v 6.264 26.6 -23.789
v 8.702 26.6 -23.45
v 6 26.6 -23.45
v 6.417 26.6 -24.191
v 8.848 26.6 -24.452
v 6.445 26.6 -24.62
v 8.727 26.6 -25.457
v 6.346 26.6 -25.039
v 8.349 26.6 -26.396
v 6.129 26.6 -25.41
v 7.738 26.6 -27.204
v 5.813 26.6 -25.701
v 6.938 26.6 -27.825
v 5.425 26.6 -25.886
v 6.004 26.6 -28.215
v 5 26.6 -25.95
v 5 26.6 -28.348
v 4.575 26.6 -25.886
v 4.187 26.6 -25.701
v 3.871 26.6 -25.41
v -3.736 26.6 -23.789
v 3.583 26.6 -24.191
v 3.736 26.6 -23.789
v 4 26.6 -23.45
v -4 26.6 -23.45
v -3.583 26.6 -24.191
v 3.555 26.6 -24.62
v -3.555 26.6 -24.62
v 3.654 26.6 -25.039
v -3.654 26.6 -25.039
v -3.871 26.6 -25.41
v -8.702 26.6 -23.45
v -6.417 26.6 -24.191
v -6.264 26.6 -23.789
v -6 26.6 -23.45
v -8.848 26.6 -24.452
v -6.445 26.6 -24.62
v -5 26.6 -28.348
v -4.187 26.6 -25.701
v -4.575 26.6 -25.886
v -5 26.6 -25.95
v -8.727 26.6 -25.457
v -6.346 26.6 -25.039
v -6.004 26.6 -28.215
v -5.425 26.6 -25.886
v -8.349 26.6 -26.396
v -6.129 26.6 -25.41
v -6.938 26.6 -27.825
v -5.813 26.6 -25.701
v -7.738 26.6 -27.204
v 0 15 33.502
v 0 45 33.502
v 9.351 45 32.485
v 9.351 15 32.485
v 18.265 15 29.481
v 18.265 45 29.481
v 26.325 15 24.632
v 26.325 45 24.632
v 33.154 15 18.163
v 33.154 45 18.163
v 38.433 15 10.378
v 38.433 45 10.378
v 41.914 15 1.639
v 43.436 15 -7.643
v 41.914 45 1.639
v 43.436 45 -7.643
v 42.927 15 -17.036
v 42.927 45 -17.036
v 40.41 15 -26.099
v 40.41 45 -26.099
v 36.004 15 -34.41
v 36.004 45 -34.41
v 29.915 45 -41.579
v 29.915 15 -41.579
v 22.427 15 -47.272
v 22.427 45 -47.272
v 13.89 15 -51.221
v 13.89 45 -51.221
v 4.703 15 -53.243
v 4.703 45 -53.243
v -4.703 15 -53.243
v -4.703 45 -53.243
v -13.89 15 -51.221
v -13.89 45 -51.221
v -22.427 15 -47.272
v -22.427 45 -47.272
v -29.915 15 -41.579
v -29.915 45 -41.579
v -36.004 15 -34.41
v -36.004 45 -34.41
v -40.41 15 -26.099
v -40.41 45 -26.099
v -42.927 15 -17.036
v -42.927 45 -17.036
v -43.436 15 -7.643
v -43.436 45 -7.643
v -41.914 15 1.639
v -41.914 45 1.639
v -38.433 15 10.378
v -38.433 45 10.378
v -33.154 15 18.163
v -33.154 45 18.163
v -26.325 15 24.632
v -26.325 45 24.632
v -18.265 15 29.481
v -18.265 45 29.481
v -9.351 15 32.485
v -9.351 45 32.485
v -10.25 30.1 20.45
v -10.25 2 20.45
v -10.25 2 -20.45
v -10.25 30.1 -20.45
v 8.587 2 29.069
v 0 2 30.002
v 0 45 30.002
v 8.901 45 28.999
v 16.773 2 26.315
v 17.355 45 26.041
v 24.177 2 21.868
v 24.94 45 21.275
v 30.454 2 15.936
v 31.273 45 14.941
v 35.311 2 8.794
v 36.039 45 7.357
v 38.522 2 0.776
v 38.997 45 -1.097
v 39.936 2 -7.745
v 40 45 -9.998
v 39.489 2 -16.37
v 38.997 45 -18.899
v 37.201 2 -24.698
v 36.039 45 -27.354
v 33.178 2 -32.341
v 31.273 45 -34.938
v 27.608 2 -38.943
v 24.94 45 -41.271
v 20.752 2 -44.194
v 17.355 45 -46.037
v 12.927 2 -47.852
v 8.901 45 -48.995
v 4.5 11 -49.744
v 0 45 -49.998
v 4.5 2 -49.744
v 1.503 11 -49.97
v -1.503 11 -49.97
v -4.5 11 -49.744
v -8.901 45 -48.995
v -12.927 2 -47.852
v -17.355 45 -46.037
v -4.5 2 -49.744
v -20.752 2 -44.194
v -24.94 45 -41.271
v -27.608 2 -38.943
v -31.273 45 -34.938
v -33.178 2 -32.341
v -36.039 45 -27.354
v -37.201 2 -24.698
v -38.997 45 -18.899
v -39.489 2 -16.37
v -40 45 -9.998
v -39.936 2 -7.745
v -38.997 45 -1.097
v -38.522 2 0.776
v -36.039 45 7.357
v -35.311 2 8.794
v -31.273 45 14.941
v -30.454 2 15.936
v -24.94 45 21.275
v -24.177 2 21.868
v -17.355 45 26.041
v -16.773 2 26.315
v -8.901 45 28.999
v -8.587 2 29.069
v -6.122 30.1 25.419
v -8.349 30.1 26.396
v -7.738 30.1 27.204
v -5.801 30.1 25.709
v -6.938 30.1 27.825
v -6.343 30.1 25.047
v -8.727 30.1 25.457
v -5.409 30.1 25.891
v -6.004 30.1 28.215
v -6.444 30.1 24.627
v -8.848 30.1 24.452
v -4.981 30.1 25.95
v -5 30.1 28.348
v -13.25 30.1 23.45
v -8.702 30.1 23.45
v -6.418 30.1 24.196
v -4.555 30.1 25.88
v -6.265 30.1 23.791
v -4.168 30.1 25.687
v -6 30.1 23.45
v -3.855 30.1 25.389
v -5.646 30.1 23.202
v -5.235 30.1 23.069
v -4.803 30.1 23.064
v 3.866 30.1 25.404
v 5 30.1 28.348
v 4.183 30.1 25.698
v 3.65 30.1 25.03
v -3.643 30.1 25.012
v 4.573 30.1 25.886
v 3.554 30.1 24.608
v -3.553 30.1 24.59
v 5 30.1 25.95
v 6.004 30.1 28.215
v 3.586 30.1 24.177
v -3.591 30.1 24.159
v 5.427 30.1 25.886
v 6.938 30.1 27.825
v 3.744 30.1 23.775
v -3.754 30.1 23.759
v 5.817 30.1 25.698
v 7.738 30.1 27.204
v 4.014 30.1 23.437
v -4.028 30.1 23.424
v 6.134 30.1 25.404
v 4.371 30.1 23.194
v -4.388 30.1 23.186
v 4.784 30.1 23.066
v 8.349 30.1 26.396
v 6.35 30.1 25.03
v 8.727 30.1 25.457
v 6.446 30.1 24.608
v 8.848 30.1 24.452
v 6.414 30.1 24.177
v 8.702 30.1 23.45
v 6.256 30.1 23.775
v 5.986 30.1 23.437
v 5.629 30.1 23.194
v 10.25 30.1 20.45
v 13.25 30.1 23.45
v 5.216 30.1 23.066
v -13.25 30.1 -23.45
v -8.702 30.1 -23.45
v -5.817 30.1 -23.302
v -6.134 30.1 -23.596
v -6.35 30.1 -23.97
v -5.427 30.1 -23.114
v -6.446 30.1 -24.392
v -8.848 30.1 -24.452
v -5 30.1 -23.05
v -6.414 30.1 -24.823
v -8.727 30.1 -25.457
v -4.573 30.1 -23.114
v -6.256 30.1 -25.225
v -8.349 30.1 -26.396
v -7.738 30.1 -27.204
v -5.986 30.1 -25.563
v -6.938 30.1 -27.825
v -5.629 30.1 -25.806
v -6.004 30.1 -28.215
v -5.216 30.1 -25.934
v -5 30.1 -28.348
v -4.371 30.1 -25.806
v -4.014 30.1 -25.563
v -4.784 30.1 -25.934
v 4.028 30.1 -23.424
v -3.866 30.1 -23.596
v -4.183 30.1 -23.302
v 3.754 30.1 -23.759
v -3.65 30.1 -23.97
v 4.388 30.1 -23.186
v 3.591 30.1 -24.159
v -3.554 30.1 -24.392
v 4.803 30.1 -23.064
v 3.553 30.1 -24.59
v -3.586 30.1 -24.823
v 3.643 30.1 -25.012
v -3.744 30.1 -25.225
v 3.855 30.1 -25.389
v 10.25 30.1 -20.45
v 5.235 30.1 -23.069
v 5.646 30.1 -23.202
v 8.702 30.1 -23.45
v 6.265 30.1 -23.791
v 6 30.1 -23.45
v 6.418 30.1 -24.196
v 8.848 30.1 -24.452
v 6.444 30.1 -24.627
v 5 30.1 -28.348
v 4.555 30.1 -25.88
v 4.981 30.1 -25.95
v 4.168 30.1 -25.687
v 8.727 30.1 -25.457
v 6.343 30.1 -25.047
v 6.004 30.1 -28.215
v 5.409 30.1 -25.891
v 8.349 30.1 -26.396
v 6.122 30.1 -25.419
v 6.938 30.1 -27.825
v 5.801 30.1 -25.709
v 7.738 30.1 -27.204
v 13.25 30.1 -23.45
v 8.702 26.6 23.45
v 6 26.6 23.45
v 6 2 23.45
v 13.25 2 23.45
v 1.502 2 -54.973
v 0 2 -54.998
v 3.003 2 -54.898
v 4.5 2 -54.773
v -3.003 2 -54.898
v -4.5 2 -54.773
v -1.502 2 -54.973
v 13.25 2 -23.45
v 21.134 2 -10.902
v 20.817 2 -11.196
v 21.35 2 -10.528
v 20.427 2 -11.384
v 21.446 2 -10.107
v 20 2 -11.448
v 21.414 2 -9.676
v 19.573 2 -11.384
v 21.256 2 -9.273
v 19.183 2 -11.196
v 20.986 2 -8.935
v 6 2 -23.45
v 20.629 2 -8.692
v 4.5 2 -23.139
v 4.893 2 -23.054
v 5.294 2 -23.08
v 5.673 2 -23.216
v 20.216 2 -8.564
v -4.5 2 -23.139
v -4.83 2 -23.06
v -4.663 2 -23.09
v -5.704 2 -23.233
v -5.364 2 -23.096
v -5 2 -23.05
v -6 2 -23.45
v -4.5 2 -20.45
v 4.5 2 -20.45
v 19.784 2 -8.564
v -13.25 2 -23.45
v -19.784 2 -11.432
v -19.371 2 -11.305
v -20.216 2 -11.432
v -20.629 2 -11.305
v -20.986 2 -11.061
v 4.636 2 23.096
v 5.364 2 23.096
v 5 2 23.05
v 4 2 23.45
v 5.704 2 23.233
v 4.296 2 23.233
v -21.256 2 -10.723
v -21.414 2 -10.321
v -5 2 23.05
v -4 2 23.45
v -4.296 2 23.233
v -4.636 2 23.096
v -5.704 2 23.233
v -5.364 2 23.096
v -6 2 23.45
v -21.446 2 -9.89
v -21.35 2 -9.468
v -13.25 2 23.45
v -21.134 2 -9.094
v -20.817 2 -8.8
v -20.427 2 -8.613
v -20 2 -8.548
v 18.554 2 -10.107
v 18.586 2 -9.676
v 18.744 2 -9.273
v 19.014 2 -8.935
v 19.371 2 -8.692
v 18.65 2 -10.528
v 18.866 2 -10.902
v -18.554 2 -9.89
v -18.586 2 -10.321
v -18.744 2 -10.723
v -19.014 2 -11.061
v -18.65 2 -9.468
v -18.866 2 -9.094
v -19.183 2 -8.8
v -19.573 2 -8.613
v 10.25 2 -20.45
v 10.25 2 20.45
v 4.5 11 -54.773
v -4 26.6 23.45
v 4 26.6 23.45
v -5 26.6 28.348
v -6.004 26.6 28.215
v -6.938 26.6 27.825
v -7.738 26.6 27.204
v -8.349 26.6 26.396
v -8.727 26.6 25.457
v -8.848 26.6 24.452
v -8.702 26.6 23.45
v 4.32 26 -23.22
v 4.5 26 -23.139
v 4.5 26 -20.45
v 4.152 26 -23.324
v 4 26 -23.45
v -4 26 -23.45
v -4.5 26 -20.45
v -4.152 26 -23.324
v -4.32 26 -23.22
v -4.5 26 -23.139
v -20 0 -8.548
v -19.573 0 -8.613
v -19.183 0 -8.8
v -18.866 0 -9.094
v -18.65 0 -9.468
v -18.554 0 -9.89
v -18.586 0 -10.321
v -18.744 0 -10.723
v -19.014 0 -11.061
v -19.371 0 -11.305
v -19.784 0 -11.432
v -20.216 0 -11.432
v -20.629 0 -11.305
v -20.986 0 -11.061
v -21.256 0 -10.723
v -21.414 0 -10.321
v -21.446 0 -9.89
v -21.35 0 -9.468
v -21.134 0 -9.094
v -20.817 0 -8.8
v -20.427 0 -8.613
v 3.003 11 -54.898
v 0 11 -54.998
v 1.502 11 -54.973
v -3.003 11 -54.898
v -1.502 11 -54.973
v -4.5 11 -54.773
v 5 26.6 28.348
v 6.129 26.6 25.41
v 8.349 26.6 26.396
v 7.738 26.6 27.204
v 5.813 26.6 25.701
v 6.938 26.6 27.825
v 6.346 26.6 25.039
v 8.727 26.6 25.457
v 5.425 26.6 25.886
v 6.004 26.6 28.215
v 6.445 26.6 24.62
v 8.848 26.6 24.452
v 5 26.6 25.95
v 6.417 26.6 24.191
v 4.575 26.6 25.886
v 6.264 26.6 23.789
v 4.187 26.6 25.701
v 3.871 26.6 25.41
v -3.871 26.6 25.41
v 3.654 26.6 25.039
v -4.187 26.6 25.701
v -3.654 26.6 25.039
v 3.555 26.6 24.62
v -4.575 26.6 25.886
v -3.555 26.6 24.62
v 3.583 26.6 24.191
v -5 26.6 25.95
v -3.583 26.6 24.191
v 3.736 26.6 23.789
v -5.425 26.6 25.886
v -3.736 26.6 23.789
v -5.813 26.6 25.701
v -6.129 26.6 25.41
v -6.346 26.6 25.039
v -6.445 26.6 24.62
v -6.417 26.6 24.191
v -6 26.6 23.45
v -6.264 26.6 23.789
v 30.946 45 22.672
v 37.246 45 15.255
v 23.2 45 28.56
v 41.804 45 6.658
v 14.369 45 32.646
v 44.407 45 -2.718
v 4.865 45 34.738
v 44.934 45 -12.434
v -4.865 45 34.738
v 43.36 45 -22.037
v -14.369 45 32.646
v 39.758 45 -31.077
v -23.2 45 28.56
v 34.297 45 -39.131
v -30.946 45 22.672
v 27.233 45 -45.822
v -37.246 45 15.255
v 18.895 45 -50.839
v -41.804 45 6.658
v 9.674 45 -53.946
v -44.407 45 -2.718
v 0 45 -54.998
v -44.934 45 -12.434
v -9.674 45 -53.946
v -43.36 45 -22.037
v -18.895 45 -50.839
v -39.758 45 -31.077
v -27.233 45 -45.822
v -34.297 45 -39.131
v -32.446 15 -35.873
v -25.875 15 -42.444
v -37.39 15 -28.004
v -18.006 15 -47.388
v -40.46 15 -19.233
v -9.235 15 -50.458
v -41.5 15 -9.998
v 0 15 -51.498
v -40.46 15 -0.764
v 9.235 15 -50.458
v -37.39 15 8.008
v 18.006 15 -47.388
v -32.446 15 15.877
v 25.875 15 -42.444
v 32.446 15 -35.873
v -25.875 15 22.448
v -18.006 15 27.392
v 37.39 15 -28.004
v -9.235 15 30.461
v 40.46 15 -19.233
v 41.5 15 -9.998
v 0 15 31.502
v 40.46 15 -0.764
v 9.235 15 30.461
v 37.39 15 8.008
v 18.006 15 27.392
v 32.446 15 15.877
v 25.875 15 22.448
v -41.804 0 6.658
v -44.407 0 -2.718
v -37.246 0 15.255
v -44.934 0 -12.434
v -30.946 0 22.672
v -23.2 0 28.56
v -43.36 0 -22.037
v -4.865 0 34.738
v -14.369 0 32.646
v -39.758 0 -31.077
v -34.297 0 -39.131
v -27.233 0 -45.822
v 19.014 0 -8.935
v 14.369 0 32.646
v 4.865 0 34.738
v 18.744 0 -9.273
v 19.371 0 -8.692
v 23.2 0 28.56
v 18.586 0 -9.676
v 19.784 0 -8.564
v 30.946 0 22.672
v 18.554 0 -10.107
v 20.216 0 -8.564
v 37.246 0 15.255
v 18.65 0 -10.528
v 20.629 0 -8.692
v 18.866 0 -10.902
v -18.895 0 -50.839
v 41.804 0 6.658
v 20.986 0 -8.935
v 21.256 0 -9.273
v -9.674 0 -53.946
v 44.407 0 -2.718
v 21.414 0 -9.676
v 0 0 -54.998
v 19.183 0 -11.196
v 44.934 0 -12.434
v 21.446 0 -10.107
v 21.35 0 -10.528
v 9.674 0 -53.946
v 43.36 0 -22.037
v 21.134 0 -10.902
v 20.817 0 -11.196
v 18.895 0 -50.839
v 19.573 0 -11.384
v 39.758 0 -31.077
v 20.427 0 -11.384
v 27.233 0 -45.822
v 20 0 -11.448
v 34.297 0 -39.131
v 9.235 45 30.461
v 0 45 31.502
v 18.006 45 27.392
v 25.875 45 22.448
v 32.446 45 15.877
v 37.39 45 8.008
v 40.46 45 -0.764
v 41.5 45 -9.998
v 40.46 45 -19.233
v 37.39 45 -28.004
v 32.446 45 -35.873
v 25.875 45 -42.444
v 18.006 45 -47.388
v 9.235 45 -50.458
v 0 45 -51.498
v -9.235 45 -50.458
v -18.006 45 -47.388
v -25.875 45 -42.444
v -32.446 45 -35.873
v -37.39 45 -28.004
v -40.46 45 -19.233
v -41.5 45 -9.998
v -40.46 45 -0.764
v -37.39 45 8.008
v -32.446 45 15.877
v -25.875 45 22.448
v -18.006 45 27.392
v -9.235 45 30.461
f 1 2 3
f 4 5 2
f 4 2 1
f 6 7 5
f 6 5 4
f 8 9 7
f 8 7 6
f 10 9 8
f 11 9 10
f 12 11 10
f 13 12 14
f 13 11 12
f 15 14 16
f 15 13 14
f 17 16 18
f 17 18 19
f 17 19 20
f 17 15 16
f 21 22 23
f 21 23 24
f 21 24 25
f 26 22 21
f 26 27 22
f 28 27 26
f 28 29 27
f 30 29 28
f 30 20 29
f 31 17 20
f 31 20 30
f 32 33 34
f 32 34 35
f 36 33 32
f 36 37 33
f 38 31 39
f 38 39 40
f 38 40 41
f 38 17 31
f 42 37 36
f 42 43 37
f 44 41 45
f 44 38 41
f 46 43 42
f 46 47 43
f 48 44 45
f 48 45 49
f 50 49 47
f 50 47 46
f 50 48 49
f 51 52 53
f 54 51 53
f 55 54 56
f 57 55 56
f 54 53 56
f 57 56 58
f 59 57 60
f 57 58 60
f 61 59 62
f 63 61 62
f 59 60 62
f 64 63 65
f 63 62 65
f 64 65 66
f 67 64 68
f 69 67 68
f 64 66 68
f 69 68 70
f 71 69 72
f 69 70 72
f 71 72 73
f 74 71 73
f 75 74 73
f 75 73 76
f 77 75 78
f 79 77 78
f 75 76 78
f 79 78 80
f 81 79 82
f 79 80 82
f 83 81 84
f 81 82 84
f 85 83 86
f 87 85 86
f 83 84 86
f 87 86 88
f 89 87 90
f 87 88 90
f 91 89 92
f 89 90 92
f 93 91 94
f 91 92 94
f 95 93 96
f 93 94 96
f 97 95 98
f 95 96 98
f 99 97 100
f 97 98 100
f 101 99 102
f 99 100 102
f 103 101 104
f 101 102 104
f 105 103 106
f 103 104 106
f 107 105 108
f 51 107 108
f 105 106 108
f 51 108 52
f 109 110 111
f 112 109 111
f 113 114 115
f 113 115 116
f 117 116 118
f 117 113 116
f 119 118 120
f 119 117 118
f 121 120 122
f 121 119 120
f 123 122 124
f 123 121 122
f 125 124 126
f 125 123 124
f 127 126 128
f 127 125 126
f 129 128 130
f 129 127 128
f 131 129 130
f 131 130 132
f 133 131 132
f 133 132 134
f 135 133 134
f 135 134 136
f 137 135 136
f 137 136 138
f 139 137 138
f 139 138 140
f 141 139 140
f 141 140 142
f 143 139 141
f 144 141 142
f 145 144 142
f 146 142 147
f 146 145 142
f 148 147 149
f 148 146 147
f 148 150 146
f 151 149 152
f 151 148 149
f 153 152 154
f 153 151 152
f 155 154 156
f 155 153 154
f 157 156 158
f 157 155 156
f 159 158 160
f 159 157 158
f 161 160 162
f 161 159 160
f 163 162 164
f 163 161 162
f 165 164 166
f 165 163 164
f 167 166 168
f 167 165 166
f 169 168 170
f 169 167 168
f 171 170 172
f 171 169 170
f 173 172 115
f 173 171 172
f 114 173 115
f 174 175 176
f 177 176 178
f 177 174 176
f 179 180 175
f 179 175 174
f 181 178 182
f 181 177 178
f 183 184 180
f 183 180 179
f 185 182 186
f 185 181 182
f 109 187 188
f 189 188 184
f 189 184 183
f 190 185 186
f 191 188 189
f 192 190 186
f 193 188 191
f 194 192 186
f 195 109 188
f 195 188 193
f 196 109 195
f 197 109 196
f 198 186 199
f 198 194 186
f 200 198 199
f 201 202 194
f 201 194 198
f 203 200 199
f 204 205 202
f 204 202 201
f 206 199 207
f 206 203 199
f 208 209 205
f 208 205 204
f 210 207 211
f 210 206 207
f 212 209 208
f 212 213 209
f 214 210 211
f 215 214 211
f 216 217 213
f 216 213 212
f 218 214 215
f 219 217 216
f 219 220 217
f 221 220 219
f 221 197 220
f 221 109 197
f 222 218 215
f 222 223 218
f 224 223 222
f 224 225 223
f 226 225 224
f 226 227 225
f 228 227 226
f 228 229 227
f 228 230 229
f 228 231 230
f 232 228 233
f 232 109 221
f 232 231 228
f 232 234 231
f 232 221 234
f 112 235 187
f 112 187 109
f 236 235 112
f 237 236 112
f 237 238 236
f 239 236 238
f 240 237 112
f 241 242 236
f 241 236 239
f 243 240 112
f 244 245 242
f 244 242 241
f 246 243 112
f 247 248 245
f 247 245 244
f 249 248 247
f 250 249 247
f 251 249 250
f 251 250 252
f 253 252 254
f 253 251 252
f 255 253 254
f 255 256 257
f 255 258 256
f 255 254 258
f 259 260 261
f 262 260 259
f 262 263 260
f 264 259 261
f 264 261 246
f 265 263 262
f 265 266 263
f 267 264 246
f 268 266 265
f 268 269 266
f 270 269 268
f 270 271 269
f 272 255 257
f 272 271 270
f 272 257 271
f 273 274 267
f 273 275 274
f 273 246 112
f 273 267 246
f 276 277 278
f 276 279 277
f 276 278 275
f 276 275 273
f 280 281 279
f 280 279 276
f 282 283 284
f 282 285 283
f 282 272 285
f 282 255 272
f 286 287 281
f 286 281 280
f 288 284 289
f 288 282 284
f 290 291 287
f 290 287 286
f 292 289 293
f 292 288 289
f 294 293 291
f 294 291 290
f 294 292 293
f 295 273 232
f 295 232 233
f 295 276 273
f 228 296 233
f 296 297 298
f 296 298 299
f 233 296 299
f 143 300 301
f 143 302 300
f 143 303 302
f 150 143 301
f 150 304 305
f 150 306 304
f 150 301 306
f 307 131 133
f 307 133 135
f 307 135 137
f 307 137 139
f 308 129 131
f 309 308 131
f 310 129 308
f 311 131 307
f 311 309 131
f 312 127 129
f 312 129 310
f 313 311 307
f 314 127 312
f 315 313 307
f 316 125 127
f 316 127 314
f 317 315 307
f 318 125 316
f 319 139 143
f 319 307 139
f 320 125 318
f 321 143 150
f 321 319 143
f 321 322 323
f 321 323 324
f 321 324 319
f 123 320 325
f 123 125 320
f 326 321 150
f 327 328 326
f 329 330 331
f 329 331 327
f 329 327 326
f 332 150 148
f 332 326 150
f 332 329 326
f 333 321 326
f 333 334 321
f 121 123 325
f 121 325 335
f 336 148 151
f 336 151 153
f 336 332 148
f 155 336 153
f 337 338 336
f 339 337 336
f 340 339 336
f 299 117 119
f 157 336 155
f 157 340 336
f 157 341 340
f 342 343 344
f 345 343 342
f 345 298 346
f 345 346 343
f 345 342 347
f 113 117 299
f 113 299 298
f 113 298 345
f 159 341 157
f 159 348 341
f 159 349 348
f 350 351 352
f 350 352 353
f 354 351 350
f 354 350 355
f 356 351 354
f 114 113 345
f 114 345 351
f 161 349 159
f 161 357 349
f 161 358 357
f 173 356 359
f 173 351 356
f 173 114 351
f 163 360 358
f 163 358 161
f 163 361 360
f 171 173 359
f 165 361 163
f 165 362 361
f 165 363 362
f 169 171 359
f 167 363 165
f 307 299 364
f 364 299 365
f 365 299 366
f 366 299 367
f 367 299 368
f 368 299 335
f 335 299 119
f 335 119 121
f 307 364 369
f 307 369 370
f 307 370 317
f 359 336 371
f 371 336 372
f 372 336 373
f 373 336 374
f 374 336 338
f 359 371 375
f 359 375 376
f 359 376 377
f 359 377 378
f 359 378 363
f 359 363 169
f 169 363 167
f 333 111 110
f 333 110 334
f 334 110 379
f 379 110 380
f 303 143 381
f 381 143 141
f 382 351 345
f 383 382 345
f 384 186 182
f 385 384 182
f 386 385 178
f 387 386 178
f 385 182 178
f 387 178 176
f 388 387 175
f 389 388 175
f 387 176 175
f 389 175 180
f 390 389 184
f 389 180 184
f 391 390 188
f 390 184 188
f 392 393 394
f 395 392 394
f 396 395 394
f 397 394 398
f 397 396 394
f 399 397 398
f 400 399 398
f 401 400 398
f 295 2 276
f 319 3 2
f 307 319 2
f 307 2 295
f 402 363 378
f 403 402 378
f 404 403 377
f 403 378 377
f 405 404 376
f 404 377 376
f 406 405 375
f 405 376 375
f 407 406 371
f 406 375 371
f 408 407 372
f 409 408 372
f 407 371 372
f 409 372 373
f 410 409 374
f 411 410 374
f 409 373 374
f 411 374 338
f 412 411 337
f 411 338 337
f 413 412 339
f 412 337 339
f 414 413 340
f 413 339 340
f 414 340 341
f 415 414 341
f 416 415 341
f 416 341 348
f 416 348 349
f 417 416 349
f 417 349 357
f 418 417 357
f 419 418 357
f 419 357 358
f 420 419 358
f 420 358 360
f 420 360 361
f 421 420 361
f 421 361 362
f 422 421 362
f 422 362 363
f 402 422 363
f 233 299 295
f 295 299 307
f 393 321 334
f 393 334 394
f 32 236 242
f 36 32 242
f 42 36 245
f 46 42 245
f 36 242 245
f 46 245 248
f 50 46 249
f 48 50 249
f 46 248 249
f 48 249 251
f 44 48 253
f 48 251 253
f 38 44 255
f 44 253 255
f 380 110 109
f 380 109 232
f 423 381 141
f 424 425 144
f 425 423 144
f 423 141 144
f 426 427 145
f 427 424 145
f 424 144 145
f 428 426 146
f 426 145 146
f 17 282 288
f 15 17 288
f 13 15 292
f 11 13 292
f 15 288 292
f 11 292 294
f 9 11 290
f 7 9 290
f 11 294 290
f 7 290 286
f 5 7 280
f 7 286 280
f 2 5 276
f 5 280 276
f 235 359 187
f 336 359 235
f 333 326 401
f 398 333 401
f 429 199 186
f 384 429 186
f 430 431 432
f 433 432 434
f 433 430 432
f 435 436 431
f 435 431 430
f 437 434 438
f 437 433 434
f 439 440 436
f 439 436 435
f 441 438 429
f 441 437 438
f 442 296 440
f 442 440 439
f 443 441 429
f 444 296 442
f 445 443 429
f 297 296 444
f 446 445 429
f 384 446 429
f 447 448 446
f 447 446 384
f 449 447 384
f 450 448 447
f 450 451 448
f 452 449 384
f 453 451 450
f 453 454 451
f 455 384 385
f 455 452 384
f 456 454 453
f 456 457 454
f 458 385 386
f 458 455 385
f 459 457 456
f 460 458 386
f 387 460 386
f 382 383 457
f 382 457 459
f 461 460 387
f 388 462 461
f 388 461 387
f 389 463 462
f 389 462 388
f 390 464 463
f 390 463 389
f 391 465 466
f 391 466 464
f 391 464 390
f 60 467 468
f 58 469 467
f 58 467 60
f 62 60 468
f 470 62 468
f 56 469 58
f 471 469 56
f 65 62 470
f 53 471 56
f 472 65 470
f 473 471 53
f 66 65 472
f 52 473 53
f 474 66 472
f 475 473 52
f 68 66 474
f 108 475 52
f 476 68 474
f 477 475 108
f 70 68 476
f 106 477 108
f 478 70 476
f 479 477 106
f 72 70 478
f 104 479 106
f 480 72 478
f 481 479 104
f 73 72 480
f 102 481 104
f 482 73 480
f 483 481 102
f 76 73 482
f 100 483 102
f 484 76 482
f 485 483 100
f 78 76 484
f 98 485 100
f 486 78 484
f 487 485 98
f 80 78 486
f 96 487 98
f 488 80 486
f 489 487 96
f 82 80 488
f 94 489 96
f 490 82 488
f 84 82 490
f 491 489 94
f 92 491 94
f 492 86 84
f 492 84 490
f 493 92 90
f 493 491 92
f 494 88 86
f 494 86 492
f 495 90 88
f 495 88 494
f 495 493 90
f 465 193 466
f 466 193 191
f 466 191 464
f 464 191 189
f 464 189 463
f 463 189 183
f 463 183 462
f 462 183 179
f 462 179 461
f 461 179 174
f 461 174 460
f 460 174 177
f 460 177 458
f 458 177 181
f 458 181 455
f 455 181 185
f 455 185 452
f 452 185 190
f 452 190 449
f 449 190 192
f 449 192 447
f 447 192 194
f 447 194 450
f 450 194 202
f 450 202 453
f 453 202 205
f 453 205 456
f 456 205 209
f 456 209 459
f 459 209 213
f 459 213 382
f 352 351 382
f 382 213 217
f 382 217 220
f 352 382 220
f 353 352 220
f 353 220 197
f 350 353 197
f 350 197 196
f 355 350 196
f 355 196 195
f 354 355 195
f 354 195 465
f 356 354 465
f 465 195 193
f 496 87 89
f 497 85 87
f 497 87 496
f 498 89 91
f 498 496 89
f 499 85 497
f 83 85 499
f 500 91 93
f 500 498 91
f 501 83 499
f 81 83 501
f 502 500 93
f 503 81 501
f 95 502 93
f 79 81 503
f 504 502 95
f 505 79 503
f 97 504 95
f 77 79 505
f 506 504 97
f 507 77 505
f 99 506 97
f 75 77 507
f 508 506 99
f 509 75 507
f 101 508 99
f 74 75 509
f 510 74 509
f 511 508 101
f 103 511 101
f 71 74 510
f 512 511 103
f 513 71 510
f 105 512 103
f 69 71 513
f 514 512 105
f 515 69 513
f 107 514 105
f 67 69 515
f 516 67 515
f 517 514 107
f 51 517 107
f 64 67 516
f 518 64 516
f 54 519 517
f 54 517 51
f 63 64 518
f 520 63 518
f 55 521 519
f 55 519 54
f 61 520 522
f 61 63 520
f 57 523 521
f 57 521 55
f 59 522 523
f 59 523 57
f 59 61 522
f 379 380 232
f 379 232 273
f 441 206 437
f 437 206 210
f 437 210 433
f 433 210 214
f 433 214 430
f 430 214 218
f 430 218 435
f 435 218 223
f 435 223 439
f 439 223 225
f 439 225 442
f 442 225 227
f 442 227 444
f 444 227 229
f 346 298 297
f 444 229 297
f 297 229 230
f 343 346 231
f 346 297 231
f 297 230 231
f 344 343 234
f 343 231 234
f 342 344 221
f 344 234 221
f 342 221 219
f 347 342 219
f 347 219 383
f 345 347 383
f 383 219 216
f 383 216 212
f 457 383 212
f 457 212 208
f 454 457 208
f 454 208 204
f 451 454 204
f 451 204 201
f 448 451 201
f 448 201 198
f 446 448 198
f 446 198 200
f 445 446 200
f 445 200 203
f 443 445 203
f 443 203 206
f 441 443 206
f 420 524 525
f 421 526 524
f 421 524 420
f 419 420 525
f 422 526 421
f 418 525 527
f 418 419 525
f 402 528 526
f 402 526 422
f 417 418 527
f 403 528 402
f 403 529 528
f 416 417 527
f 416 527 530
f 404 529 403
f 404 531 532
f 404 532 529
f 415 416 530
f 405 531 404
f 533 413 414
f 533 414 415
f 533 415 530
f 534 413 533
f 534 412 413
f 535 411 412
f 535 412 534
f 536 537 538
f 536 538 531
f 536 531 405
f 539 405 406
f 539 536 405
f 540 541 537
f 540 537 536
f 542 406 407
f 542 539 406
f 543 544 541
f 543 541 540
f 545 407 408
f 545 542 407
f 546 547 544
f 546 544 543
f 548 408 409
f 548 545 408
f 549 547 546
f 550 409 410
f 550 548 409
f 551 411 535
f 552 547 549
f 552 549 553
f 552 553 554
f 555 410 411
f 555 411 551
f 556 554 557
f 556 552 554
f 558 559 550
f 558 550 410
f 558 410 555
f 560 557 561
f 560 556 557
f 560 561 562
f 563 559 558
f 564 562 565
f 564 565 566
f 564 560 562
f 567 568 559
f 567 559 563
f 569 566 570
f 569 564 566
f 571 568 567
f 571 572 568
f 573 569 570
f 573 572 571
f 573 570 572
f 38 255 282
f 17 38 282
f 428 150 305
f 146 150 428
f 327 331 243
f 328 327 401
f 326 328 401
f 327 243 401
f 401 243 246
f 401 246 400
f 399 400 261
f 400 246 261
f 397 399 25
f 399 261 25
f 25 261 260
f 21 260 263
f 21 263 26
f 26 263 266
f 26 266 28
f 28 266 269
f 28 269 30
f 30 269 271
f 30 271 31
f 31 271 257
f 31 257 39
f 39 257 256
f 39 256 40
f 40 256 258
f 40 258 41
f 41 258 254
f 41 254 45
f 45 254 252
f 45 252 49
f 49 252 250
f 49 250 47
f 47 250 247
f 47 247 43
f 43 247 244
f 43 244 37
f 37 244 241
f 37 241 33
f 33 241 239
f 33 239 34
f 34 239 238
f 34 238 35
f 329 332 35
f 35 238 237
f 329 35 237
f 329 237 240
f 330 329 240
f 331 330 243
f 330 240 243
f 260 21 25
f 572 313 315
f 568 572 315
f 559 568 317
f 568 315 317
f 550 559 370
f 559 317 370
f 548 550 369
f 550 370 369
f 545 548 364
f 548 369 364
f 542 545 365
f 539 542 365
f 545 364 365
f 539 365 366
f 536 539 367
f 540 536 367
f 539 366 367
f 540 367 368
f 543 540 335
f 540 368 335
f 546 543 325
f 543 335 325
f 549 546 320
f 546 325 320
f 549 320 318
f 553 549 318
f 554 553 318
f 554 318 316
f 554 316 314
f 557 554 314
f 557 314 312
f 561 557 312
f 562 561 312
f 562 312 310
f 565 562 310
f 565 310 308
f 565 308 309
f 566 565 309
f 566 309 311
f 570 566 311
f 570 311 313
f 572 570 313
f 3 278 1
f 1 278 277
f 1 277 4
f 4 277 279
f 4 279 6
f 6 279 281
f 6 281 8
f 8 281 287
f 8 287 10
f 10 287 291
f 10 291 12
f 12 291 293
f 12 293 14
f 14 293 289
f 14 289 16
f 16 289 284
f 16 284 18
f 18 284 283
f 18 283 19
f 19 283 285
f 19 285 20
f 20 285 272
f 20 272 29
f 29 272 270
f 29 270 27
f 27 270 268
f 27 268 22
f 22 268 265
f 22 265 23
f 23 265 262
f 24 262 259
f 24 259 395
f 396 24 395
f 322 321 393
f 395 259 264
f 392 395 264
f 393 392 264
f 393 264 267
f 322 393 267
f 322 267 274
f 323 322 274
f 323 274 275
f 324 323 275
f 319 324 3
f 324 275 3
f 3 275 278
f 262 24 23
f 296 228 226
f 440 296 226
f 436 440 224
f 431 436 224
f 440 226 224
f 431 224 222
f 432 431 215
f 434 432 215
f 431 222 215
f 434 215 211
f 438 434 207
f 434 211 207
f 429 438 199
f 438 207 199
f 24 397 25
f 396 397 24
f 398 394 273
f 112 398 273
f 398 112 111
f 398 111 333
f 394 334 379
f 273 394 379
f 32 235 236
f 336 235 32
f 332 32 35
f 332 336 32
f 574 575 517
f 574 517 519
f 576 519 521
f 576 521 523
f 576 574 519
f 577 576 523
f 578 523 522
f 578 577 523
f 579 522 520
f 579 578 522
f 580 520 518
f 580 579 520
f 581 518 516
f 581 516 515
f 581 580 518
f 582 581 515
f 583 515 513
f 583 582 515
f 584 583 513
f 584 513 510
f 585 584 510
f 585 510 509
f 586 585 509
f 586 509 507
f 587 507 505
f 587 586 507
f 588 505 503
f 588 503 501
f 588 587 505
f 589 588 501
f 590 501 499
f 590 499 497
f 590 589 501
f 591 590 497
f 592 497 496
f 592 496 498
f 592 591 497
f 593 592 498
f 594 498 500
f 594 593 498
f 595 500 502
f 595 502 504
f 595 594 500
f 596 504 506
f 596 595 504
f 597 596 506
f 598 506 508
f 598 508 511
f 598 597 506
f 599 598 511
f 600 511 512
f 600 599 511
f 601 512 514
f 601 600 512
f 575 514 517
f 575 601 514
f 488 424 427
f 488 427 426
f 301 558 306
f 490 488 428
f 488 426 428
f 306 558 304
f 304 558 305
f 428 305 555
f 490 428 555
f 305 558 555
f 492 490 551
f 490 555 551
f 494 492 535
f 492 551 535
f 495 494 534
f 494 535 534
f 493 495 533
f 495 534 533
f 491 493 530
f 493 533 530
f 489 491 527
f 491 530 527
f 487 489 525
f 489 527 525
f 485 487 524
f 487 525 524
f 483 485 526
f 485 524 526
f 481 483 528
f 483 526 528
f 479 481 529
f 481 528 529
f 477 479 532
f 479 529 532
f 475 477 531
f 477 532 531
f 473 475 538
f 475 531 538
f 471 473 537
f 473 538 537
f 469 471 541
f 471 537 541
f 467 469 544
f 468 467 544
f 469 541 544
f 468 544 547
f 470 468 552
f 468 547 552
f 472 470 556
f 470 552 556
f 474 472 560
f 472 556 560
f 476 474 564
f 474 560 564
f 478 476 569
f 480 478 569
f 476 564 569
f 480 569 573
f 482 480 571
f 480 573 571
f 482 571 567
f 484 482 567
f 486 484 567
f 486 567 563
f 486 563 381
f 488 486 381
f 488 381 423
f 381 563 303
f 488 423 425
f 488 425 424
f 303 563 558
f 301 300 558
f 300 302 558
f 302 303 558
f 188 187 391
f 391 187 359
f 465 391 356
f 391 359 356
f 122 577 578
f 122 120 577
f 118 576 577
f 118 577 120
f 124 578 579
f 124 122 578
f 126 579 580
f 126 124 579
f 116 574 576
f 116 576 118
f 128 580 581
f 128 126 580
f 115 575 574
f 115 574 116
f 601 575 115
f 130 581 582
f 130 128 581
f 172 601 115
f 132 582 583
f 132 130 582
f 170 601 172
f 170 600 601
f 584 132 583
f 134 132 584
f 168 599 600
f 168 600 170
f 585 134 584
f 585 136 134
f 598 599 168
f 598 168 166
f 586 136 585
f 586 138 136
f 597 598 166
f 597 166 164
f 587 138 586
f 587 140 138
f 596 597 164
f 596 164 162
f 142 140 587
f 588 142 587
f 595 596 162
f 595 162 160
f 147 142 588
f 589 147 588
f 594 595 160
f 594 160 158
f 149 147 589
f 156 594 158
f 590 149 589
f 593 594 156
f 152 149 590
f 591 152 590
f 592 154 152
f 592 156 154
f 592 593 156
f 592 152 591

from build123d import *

# Parameters (mm, degrees)
CROQUIS2_R              = 1.45
SALIENTE_EXTRUIR1_DEPTH = 2
CROQUIS3_W              = 26.5
CROQUIS3_H              = 46.9
CROQUIS3_W_2            = 20.5
CROQUIS3_H_2            = 40.9
SALIENTE_EXTRUIR2_DEPTH = 28.1
SALIENTE_EXTRUIR3_DEPTH = 3.5
CROQUIS5_R              = 1.45
CORTAR_EXTRUIR1_DEPTH   = 48.534565862
CROQUIS6_W              = 9
CROQUIS6_H              = 24
CORTAR_EXTRUIR2_DEPTH   = 3.5
CROQUIS7_R              = 45
SALIENTE_EXTRUIR4_DEPTH = 2
CROQUIS8_R              = 45
CROQUIS8_R_2            = 40
SALIENTE_EXTRUIR5_DEPTH = 43
CROQUIS9_R              = 43.5
CROQUIS9_R_2            = 41.5
CORTAR_EXTRUIR3_DEPTH   = 30
CROQUIS10_W             = 9
CROQUIS10_H             = 9
CORTAR_EXTRUIR4_DEPTH   = 87.409541035
CROQUIS11_R             = 1.45
CORTAR_EXTRUIR5_DEPTH   = 84.05905068


with BuildPart() as part:
    # Croquis2 → Saliente-Extruir1 (new body)
    with BuildSketch(Plane(origin=(0, 0, 0), x_dir=(1, 0, 0), z_dir=(0, 1, 0))):
        with BuildLine():
            Line((-23.45, 5), (-23.45, -5))
            ThreePointArc((-23.45, -5), (-22.439518395, -7.439518395), (-20, -8.45))
            Line((-20, -8.45), (-13.25, -8.45))
            Line((-13.25, -8.45), (-13.25, -23.45))
            Line((-13.25, -23.45), (13.25, -23.45))
            Line((13.25, -23.45), (13.25, -8.45))
            Line((13.25, -8.45), (20, -8.45))
            ThreePointArc((20, -8.45), (22.439518395, -7.439518395), (23.45, -5))
            Line((23.45, -5), (23.45, 5))
            ThreePointArc((23.45, 5), (22.439518395, 7.439518395), (20, 8.45))
            Line((20, 8.45), (13.25, 8.45))
            Line((13.25, 8.45), (13.25, 23.45))
            Line((13.25, 23.45), (-13.25, 23.45))
            Line((-13.25, 23.45), (-13.25, 8.45))
            Line((-13.25, 8.45), (-20, 8.45))
            ThreePointArc((-20, 8.45), (-22.439518395, 7.439518395), (-23.45, 5))
        make_face()
        with Locations(Location((-20, 5, 0), (0, 0, 270))):
            Circle(CROQUIS2_R, mode=Mode.SUBTRACT)
        with Locations(Location((-20, -5, 0), (0, 0, 90))):
            Circle(CROQUIS2_R, mode=Mode.SUBTRACT)
        with Locations(Location((20, -5, 0), (0, 0, 270))):
            Circle(CROQUIS2_R, mode=Mode.SUBTRACT)
        with Locations(Location((20, 5, 0), (0, 0, 90))):
            Circle(CROQUIS2_R, mode=Mode.SUBTRACT)
        with Locations(Location((-20, 0, 0), (0, 0, 270))):
            Circle(CROQUIS2_R, mode=Mode.SUBTRACT)
        with Locations(Location((20, 0, 0), (0, 0, 90))):
            Circle(CROQUIS2_R, mode=Mode.SUBTRACT)
    extrude(amount=SALIENTE_EXTRUIR1_DEPTH)

    # Croquis3 → Saliente-Extruir2 (add)
    with BuildSketch(Plane(origin=(0, 2, 0), x_dir=(1, 0, 0), z_dir=(0, 1, 0))):
        Rectangle(CROQUIS3_W, CROQUIS3_H)
        Rectangle(CROQUIS3_W_2, CROQUIS3_H_2, mode=Mode.SUBTRACT)
    extrude(amount=SALIENTE_EXTRUIR2_DEPTH)

    # Croquis4 → Saliente-Extruir3 (add)
    with BuildSketch(Plane(origin=(0, 30.1, 0), x_dir=(1, 0, 0), z_dir=(0, 1, 0))):
        with BuildLine():
            Line((-5, 28.348235425), (5, 28.348235425))
            ThreePointArc((5, 28.348235425), (8.069980707, 26.820373751), (8.702217698, 23.45))
            Line((8.702217698, 23.45), (-8.702217698, 23.45))
            ThreePointArc((-8.702217698, 23.45), (-8.069980707, 26.820373751), (-5, 28.348235425))
        make_face()
        with BuildLine():
            Line((-8.702217698, -23.45), (8.702217698, -23.45))
            ThreePointArc((8.702217698, -23.45), (8.069980707, -26.820373751), (5, -28.348235425))
            Line((5, -28.348235425), (-5, -28.348235425))
            ThreePointArc((-5, -28.348235425), (-8.069980707, -26.820373751), (-8.702217698, -23.45))
        make_face()
    extrude(amount=-SALIENTE_EXTRUIR3_DEPTH)

    # Croquis5 → Cortar-Extruir1 (cut, through all)
    with BuildSketch(Plane(origin=(0, 30.1, 0), x_dir=(1, 0, 0), z_dir=(0, 1, 0))):
        with Locations(Location((-5, 24.5, 0), (0, 0, 270))):
            Circle(CROQUIS5_R)
        with Locations(Location((5, 24.5, 0), (0, 0, 313.602818973))):
            Circle(CROQUIS5_R)
        with Locations(Location((5, -24.5, 0), (0, 0, 270))):
            Circle(CROQUIS5_R)
        with Locations(Location((-5, -24.5, 0), (0, 0, 133.602818973))):
            Circle(CROQUIS5_R)
    extrude(amount=-CORTAR_EXTRUIR1_DEPTH, mode=Mode.SUBTRACT)

    # Croquis6 → Cortar-Extruir2 (cut)
    with BuildSketch(Plane(origin=(0, 0, -23.45), x_dir=(-1, 0, 0), z_dir=(0, 0, -1))):
        with Locations((0, 14)):
            Rectangle(CROQUIS6_W, CROQUIS6_H)
    extrude(amount=-CORTAR_EXTRUIR2_DEPTH, mode=Mode.SUBTRACT)

    # Croquis7 → Saliente-Extruir4 (add)
    with BuildSketch(Plane.XZ):
        with Locations(Location((0, -9.998235425, 0), (0, 0, 270))):
            Circle(CROQUIS7_R)
    extrude(amount=-SALIENTE_EXTRUIR4_DEPTH)

    # Croquis8 → Saliente-Extruir5 (add)
    with BuildSketch(Plane(origin=(0, 2, 0), x_dir=(1, 0, 0), z_dir=(0, 1, 0))):
        with Locations(Location((0, 9.998235425, 0), (0, 0, 90))):
            Circle(CROQUIS8_R)
        with Locations(Location((0, 9.998235425, 0), (0, 0, 270))):
            Circle(CROQUIS8_R_2, mode=Mode.SUBTRACT)
    extrude(amount=SALIENTE_EXTRUIR5_DEPTH)

    # Croquis9 → Cortar-Extruir3 (cut)
    with BuildSketch(Plane(origin=(0, 45, 0), x_dir=(1, 0, 0), z_dir=(0, 1, 0))):
        with Locations(Location((0, 9.998235425, 0), (0, 0, 270))):
            Circle(CROQUIS9_R)
        with Locations(Location((0, 9.998235425, 0), (0, 0, 270))):
            Circle(CROQUIS9_R_2, mode=Mode.SUBTRACT)
    extrude(amount=-CORTAR_EXTRUIR3_DEPTH, mode=Mode.SUBTRACT)

    # Croquis10 → Cortar-Extruir4 (cut, through all)
    with BuildSketch(Plane(origin=(0, 0, -23.45), x_dir=(-1, 0, 0), z_dir=(0, 0, -1))):
        with Locations((0, 6.5)):
            Rectangle(CROQUIS10_W, CROQUIS10_H)
    extrude(amount=CORTAR_EXTRUIR4_DEPTH, mode=Mode.SUBTRACT)

    # Croquis11 → Cortar-Extruir5 (cut, through all)
    with BuildSketch(Plane(origin=(0, 2, 0), x_dir=(1, 0, 0), z_dir=(0, 1, 0))):
        with Locations(Location((-20, 9.998235425, 0), (0, 0, 270))):
            Circle(CROQUIS11_R)
        with Locations(Location((20, 9.998235425, 0), (0, 0, 90))):
            Circle(CROQUIS11_R)
    extrude(amount=-CORTAR_EXTRUIR5_DEPTH, mode=Mode.SUBTRACT)


solid = part.part
